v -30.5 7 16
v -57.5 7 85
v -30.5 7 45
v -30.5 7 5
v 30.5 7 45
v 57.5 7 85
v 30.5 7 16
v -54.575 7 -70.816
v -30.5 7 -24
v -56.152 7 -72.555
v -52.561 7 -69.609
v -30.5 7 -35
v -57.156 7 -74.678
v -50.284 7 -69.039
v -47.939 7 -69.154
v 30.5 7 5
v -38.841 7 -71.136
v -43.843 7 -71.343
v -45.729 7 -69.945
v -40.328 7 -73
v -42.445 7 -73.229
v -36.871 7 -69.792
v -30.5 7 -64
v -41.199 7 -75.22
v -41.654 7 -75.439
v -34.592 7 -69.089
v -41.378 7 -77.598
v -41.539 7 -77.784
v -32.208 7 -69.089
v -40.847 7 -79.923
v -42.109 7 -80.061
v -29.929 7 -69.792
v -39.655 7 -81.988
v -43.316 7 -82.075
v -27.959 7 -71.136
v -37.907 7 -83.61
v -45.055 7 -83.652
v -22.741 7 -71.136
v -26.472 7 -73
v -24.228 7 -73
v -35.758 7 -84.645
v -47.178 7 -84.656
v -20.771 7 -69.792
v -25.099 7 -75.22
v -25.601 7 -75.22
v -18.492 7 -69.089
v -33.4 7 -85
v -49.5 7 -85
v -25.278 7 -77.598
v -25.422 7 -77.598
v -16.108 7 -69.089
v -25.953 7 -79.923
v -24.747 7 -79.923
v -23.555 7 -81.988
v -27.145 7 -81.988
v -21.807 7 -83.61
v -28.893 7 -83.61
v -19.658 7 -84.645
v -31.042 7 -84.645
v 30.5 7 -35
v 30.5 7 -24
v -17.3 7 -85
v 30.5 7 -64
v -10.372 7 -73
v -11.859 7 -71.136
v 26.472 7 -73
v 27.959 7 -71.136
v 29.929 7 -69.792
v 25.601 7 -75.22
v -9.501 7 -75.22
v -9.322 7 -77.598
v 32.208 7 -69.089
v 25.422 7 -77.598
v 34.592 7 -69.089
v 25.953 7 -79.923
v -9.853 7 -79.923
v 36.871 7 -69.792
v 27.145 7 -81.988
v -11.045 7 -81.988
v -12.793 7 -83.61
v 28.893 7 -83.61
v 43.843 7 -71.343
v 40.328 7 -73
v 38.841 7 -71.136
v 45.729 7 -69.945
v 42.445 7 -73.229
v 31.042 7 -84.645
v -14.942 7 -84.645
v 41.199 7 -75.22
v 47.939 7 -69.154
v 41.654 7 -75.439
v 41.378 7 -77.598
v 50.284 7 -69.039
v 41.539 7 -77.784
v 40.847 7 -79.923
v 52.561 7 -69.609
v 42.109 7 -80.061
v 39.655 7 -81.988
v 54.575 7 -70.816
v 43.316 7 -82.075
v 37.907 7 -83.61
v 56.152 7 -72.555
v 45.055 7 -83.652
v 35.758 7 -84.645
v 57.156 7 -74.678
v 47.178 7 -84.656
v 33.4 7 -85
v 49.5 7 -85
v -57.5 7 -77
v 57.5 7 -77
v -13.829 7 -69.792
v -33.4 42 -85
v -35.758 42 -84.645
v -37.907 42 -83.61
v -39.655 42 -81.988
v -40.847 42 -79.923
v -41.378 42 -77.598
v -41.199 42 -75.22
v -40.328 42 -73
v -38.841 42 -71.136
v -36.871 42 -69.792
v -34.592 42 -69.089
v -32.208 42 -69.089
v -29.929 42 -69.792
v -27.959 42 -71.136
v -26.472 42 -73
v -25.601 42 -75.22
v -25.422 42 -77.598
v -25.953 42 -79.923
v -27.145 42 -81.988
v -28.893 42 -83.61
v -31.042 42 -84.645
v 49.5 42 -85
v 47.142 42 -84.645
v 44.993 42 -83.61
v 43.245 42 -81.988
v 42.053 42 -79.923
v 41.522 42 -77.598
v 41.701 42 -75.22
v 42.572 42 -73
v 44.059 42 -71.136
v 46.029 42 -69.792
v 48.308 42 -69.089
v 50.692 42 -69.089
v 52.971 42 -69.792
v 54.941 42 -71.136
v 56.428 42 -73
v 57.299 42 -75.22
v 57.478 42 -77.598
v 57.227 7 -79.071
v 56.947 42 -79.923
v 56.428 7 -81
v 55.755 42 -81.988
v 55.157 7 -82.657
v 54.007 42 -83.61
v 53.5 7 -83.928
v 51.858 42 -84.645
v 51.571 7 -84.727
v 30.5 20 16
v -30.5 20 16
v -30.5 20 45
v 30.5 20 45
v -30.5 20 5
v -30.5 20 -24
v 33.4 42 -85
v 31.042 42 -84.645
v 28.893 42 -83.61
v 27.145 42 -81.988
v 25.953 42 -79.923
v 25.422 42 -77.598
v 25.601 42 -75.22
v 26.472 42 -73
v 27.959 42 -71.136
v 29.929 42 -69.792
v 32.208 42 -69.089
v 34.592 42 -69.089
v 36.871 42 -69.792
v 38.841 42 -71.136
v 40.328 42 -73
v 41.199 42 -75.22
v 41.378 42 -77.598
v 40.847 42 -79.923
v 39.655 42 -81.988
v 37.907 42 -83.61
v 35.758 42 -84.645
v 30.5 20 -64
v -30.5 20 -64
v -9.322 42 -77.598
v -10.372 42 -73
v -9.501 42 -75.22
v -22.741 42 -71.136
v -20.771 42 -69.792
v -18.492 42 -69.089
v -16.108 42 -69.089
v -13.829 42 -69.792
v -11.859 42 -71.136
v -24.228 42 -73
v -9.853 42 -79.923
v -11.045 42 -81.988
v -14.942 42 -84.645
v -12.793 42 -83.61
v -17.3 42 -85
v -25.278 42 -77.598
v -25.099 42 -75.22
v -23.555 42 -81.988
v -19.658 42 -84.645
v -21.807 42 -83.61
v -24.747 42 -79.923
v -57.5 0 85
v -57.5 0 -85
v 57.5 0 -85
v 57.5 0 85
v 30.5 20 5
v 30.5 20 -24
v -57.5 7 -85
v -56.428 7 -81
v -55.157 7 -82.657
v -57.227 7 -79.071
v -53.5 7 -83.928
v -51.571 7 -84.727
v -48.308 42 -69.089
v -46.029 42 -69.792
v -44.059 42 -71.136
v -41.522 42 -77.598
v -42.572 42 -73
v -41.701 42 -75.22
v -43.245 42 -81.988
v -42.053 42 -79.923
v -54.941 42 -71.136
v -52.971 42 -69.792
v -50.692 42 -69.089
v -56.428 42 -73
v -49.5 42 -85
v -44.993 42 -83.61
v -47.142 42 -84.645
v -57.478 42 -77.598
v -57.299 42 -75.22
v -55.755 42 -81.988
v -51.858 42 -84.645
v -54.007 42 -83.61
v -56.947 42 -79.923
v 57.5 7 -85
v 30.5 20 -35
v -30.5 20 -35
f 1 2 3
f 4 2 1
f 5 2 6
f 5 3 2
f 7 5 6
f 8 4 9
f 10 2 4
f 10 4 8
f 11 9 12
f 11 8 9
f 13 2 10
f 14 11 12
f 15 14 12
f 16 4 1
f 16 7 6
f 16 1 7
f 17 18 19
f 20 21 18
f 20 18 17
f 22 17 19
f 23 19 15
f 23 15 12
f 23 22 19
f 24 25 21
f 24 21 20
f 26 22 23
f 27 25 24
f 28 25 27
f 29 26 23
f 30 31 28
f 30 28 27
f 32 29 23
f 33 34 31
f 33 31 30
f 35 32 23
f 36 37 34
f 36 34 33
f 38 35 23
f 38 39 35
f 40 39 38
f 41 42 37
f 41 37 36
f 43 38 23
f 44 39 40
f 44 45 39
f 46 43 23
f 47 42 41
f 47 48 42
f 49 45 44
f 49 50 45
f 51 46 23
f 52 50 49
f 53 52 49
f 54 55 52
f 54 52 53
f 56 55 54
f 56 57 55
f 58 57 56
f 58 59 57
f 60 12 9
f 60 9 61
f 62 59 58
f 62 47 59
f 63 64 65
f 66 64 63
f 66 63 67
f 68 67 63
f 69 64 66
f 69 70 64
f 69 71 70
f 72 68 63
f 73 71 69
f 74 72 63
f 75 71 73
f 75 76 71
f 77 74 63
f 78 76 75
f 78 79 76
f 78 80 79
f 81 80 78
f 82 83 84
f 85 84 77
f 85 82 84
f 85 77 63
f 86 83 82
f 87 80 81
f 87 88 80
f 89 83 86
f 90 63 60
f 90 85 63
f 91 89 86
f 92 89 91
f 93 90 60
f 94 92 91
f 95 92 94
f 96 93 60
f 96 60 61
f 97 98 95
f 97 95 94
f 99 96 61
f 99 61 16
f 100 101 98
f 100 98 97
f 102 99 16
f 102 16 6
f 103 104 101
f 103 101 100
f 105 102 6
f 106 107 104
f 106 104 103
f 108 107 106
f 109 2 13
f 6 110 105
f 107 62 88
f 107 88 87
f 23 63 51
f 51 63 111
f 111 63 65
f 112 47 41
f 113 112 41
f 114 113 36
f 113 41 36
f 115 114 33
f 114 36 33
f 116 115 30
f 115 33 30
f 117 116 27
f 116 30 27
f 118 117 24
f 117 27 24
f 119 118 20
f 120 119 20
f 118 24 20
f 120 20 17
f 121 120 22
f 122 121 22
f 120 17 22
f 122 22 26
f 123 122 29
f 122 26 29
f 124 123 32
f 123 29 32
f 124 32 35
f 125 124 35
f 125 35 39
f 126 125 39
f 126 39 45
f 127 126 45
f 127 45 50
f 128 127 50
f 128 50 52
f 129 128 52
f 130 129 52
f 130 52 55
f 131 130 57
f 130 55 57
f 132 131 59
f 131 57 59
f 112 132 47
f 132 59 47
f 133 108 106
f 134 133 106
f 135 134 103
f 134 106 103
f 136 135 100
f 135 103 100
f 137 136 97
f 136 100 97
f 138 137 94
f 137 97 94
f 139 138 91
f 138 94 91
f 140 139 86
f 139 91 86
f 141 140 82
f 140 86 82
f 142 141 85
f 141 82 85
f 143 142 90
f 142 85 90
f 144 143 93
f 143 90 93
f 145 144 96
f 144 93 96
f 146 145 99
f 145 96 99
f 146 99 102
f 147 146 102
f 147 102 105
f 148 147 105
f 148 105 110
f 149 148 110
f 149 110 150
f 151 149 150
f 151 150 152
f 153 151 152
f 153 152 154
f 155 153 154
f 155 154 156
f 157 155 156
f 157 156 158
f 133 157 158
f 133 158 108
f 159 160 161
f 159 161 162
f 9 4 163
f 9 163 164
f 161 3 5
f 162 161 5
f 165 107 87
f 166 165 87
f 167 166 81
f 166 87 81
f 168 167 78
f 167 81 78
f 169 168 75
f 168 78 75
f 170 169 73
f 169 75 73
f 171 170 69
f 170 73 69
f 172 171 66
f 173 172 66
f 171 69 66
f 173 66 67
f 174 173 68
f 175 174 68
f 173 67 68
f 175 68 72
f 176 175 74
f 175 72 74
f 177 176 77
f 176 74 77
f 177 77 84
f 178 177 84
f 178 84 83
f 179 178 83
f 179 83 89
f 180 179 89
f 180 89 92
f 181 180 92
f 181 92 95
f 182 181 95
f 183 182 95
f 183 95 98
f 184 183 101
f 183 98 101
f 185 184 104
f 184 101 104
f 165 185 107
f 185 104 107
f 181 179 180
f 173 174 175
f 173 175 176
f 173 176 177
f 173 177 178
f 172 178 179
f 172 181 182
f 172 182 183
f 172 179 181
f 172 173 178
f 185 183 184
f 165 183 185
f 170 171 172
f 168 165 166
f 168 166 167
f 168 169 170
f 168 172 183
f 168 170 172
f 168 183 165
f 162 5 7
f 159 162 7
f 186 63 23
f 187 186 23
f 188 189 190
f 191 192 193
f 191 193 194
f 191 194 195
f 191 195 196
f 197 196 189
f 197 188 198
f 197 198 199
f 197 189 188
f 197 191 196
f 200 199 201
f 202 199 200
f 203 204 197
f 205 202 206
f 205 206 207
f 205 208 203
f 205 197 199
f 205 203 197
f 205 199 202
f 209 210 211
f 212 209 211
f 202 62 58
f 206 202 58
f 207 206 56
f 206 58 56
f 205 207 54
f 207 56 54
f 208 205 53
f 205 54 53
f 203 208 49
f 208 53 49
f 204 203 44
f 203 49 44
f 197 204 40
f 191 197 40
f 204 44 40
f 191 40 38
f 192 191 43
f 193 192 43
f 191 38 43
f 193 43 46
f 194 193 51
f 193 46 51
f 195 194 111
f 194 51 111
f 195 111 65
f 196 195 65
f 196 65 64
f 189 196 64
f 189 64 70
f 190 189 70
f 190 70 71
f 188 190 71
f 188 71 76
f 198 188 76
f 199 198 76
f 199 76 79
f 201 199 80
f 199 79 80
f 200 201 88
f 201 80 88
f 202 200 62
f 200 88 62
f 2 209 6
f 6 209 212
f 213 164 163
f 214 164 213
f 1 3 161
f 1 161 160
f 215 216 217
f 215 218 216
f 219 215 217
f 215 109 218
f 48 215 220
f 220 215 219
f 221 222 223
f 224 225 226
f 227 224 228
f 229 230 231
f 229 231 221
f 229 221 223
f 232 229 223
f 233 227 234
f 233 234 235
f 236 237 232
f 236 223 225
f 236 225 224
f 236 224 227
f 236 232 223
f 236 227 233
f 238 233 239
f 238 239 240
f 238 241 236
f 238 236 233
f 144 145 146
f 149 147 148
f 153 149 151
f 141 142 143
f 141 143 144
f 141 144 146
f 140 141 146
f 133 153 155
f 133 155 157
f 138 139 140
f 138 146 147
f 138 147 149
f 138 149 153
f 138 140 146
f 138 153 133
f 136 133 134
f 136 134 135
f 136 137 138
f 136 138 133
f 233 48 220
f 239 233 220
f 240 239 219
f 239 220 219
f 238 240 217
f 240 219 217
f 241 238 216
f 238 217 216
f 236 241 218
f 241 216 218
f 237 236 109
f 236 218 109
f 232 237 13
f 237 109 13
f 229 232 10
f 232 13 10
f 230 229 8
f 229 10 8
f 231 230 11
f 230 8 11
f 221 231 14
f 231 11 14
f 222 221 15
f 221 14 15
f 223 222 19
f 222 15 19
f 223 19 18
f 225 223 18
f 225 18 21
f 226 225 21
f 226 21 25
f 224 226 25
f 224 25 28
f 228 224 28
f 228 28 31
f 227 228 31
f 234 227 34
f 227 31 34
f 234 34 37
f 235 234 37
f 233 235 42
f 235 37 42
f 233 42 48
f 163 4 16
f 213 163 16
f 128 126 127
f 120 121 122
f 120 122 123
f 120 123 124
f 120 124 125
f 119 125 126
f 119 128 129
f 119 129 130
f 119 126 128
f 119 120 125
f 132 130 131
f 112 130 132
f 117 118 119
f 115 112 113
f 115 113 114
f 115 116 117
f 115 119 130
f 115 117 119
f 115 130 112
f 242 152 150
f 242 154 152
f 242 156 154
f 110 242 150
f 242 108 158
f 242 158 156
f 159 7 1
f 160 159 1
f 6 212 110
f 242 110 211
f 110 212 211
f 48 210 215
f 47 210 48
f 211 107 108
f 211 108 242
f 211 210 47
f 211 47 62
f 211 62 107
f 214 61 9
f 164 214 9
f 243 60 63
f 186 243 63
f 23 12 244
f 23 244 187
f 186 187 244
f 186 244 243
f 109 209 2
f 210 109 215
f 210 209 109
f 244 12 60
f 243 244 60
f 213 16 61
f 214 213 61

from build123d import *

# Parameters (mm, degrees)
SKETCH1_W           = 115
SKETCH1_H           = 170
BOSS_EXTRUDE1_DEPTH = 7
SKETCH2_W           = 61
SKETCH2_H           = 29
BOSS_EXTRUDE6_DEPTH = 13
SKETCH2_6_R         = 8
BOSS_EXTRUDE9_DEPTH = 35


with BuildPart() as part:
    # Sketch1 → Boss-Extrude1 (new body)
    with BuildSketch(Plane(origin=(0, 0, 0), x_dir=(1, 0, 0), z_dir=(0, 1, 0))):
        Rectangle(SKETCH1_W, SKETCH1_H)
    extrude(amount=BOSS_EXTRUDE1_DEPTH)

    # Sketch2 → Boss-Extrude6 (add)
    with BuildSketch(Plane(origin=(0, 7, 0), x_dir=(1, 0, 0), z_dir=(0, 1, 0))):
        with Locations((0, 49.5)):
            Rectangle(SKETCH2_W, SKETCH2_H)
        with Locations((0, -30.5)):
            Rectangle(SKETCH2_W, SKETCH2_H)
        with Locations((0, 9.5)):
            Rectangle(SKETCH2_W, SKETCH2_H)
    extrude(amount=BOSS_EXTRUDE6_DEPTH)

    # Sketch2<6> → Boss-Extrude9 (add)
    with BuildSketch(Plane(origin=(0, 7, 0), x_dir=(1, 0, 0), z_dir=(0, 1, 0))):
        with Locations((-49.5, 77)):
            Circle(SKETCH2_6_R)
        with Locations((-33.4, 77)):
            Circle(SKETCH2_6_R)
        with Locations((-17.3, 77)):
            Circle(SKETCH2_6_R)
        with Locations((33.4, 77)):
            Circle(SKETCH2_6_R)
        with Locations((49.5, 77)):
            Circle(SKETCH2_6_R)
    extrude(amount=BOSS_EXTRUDE9_DEPTH)


solid = part.part
